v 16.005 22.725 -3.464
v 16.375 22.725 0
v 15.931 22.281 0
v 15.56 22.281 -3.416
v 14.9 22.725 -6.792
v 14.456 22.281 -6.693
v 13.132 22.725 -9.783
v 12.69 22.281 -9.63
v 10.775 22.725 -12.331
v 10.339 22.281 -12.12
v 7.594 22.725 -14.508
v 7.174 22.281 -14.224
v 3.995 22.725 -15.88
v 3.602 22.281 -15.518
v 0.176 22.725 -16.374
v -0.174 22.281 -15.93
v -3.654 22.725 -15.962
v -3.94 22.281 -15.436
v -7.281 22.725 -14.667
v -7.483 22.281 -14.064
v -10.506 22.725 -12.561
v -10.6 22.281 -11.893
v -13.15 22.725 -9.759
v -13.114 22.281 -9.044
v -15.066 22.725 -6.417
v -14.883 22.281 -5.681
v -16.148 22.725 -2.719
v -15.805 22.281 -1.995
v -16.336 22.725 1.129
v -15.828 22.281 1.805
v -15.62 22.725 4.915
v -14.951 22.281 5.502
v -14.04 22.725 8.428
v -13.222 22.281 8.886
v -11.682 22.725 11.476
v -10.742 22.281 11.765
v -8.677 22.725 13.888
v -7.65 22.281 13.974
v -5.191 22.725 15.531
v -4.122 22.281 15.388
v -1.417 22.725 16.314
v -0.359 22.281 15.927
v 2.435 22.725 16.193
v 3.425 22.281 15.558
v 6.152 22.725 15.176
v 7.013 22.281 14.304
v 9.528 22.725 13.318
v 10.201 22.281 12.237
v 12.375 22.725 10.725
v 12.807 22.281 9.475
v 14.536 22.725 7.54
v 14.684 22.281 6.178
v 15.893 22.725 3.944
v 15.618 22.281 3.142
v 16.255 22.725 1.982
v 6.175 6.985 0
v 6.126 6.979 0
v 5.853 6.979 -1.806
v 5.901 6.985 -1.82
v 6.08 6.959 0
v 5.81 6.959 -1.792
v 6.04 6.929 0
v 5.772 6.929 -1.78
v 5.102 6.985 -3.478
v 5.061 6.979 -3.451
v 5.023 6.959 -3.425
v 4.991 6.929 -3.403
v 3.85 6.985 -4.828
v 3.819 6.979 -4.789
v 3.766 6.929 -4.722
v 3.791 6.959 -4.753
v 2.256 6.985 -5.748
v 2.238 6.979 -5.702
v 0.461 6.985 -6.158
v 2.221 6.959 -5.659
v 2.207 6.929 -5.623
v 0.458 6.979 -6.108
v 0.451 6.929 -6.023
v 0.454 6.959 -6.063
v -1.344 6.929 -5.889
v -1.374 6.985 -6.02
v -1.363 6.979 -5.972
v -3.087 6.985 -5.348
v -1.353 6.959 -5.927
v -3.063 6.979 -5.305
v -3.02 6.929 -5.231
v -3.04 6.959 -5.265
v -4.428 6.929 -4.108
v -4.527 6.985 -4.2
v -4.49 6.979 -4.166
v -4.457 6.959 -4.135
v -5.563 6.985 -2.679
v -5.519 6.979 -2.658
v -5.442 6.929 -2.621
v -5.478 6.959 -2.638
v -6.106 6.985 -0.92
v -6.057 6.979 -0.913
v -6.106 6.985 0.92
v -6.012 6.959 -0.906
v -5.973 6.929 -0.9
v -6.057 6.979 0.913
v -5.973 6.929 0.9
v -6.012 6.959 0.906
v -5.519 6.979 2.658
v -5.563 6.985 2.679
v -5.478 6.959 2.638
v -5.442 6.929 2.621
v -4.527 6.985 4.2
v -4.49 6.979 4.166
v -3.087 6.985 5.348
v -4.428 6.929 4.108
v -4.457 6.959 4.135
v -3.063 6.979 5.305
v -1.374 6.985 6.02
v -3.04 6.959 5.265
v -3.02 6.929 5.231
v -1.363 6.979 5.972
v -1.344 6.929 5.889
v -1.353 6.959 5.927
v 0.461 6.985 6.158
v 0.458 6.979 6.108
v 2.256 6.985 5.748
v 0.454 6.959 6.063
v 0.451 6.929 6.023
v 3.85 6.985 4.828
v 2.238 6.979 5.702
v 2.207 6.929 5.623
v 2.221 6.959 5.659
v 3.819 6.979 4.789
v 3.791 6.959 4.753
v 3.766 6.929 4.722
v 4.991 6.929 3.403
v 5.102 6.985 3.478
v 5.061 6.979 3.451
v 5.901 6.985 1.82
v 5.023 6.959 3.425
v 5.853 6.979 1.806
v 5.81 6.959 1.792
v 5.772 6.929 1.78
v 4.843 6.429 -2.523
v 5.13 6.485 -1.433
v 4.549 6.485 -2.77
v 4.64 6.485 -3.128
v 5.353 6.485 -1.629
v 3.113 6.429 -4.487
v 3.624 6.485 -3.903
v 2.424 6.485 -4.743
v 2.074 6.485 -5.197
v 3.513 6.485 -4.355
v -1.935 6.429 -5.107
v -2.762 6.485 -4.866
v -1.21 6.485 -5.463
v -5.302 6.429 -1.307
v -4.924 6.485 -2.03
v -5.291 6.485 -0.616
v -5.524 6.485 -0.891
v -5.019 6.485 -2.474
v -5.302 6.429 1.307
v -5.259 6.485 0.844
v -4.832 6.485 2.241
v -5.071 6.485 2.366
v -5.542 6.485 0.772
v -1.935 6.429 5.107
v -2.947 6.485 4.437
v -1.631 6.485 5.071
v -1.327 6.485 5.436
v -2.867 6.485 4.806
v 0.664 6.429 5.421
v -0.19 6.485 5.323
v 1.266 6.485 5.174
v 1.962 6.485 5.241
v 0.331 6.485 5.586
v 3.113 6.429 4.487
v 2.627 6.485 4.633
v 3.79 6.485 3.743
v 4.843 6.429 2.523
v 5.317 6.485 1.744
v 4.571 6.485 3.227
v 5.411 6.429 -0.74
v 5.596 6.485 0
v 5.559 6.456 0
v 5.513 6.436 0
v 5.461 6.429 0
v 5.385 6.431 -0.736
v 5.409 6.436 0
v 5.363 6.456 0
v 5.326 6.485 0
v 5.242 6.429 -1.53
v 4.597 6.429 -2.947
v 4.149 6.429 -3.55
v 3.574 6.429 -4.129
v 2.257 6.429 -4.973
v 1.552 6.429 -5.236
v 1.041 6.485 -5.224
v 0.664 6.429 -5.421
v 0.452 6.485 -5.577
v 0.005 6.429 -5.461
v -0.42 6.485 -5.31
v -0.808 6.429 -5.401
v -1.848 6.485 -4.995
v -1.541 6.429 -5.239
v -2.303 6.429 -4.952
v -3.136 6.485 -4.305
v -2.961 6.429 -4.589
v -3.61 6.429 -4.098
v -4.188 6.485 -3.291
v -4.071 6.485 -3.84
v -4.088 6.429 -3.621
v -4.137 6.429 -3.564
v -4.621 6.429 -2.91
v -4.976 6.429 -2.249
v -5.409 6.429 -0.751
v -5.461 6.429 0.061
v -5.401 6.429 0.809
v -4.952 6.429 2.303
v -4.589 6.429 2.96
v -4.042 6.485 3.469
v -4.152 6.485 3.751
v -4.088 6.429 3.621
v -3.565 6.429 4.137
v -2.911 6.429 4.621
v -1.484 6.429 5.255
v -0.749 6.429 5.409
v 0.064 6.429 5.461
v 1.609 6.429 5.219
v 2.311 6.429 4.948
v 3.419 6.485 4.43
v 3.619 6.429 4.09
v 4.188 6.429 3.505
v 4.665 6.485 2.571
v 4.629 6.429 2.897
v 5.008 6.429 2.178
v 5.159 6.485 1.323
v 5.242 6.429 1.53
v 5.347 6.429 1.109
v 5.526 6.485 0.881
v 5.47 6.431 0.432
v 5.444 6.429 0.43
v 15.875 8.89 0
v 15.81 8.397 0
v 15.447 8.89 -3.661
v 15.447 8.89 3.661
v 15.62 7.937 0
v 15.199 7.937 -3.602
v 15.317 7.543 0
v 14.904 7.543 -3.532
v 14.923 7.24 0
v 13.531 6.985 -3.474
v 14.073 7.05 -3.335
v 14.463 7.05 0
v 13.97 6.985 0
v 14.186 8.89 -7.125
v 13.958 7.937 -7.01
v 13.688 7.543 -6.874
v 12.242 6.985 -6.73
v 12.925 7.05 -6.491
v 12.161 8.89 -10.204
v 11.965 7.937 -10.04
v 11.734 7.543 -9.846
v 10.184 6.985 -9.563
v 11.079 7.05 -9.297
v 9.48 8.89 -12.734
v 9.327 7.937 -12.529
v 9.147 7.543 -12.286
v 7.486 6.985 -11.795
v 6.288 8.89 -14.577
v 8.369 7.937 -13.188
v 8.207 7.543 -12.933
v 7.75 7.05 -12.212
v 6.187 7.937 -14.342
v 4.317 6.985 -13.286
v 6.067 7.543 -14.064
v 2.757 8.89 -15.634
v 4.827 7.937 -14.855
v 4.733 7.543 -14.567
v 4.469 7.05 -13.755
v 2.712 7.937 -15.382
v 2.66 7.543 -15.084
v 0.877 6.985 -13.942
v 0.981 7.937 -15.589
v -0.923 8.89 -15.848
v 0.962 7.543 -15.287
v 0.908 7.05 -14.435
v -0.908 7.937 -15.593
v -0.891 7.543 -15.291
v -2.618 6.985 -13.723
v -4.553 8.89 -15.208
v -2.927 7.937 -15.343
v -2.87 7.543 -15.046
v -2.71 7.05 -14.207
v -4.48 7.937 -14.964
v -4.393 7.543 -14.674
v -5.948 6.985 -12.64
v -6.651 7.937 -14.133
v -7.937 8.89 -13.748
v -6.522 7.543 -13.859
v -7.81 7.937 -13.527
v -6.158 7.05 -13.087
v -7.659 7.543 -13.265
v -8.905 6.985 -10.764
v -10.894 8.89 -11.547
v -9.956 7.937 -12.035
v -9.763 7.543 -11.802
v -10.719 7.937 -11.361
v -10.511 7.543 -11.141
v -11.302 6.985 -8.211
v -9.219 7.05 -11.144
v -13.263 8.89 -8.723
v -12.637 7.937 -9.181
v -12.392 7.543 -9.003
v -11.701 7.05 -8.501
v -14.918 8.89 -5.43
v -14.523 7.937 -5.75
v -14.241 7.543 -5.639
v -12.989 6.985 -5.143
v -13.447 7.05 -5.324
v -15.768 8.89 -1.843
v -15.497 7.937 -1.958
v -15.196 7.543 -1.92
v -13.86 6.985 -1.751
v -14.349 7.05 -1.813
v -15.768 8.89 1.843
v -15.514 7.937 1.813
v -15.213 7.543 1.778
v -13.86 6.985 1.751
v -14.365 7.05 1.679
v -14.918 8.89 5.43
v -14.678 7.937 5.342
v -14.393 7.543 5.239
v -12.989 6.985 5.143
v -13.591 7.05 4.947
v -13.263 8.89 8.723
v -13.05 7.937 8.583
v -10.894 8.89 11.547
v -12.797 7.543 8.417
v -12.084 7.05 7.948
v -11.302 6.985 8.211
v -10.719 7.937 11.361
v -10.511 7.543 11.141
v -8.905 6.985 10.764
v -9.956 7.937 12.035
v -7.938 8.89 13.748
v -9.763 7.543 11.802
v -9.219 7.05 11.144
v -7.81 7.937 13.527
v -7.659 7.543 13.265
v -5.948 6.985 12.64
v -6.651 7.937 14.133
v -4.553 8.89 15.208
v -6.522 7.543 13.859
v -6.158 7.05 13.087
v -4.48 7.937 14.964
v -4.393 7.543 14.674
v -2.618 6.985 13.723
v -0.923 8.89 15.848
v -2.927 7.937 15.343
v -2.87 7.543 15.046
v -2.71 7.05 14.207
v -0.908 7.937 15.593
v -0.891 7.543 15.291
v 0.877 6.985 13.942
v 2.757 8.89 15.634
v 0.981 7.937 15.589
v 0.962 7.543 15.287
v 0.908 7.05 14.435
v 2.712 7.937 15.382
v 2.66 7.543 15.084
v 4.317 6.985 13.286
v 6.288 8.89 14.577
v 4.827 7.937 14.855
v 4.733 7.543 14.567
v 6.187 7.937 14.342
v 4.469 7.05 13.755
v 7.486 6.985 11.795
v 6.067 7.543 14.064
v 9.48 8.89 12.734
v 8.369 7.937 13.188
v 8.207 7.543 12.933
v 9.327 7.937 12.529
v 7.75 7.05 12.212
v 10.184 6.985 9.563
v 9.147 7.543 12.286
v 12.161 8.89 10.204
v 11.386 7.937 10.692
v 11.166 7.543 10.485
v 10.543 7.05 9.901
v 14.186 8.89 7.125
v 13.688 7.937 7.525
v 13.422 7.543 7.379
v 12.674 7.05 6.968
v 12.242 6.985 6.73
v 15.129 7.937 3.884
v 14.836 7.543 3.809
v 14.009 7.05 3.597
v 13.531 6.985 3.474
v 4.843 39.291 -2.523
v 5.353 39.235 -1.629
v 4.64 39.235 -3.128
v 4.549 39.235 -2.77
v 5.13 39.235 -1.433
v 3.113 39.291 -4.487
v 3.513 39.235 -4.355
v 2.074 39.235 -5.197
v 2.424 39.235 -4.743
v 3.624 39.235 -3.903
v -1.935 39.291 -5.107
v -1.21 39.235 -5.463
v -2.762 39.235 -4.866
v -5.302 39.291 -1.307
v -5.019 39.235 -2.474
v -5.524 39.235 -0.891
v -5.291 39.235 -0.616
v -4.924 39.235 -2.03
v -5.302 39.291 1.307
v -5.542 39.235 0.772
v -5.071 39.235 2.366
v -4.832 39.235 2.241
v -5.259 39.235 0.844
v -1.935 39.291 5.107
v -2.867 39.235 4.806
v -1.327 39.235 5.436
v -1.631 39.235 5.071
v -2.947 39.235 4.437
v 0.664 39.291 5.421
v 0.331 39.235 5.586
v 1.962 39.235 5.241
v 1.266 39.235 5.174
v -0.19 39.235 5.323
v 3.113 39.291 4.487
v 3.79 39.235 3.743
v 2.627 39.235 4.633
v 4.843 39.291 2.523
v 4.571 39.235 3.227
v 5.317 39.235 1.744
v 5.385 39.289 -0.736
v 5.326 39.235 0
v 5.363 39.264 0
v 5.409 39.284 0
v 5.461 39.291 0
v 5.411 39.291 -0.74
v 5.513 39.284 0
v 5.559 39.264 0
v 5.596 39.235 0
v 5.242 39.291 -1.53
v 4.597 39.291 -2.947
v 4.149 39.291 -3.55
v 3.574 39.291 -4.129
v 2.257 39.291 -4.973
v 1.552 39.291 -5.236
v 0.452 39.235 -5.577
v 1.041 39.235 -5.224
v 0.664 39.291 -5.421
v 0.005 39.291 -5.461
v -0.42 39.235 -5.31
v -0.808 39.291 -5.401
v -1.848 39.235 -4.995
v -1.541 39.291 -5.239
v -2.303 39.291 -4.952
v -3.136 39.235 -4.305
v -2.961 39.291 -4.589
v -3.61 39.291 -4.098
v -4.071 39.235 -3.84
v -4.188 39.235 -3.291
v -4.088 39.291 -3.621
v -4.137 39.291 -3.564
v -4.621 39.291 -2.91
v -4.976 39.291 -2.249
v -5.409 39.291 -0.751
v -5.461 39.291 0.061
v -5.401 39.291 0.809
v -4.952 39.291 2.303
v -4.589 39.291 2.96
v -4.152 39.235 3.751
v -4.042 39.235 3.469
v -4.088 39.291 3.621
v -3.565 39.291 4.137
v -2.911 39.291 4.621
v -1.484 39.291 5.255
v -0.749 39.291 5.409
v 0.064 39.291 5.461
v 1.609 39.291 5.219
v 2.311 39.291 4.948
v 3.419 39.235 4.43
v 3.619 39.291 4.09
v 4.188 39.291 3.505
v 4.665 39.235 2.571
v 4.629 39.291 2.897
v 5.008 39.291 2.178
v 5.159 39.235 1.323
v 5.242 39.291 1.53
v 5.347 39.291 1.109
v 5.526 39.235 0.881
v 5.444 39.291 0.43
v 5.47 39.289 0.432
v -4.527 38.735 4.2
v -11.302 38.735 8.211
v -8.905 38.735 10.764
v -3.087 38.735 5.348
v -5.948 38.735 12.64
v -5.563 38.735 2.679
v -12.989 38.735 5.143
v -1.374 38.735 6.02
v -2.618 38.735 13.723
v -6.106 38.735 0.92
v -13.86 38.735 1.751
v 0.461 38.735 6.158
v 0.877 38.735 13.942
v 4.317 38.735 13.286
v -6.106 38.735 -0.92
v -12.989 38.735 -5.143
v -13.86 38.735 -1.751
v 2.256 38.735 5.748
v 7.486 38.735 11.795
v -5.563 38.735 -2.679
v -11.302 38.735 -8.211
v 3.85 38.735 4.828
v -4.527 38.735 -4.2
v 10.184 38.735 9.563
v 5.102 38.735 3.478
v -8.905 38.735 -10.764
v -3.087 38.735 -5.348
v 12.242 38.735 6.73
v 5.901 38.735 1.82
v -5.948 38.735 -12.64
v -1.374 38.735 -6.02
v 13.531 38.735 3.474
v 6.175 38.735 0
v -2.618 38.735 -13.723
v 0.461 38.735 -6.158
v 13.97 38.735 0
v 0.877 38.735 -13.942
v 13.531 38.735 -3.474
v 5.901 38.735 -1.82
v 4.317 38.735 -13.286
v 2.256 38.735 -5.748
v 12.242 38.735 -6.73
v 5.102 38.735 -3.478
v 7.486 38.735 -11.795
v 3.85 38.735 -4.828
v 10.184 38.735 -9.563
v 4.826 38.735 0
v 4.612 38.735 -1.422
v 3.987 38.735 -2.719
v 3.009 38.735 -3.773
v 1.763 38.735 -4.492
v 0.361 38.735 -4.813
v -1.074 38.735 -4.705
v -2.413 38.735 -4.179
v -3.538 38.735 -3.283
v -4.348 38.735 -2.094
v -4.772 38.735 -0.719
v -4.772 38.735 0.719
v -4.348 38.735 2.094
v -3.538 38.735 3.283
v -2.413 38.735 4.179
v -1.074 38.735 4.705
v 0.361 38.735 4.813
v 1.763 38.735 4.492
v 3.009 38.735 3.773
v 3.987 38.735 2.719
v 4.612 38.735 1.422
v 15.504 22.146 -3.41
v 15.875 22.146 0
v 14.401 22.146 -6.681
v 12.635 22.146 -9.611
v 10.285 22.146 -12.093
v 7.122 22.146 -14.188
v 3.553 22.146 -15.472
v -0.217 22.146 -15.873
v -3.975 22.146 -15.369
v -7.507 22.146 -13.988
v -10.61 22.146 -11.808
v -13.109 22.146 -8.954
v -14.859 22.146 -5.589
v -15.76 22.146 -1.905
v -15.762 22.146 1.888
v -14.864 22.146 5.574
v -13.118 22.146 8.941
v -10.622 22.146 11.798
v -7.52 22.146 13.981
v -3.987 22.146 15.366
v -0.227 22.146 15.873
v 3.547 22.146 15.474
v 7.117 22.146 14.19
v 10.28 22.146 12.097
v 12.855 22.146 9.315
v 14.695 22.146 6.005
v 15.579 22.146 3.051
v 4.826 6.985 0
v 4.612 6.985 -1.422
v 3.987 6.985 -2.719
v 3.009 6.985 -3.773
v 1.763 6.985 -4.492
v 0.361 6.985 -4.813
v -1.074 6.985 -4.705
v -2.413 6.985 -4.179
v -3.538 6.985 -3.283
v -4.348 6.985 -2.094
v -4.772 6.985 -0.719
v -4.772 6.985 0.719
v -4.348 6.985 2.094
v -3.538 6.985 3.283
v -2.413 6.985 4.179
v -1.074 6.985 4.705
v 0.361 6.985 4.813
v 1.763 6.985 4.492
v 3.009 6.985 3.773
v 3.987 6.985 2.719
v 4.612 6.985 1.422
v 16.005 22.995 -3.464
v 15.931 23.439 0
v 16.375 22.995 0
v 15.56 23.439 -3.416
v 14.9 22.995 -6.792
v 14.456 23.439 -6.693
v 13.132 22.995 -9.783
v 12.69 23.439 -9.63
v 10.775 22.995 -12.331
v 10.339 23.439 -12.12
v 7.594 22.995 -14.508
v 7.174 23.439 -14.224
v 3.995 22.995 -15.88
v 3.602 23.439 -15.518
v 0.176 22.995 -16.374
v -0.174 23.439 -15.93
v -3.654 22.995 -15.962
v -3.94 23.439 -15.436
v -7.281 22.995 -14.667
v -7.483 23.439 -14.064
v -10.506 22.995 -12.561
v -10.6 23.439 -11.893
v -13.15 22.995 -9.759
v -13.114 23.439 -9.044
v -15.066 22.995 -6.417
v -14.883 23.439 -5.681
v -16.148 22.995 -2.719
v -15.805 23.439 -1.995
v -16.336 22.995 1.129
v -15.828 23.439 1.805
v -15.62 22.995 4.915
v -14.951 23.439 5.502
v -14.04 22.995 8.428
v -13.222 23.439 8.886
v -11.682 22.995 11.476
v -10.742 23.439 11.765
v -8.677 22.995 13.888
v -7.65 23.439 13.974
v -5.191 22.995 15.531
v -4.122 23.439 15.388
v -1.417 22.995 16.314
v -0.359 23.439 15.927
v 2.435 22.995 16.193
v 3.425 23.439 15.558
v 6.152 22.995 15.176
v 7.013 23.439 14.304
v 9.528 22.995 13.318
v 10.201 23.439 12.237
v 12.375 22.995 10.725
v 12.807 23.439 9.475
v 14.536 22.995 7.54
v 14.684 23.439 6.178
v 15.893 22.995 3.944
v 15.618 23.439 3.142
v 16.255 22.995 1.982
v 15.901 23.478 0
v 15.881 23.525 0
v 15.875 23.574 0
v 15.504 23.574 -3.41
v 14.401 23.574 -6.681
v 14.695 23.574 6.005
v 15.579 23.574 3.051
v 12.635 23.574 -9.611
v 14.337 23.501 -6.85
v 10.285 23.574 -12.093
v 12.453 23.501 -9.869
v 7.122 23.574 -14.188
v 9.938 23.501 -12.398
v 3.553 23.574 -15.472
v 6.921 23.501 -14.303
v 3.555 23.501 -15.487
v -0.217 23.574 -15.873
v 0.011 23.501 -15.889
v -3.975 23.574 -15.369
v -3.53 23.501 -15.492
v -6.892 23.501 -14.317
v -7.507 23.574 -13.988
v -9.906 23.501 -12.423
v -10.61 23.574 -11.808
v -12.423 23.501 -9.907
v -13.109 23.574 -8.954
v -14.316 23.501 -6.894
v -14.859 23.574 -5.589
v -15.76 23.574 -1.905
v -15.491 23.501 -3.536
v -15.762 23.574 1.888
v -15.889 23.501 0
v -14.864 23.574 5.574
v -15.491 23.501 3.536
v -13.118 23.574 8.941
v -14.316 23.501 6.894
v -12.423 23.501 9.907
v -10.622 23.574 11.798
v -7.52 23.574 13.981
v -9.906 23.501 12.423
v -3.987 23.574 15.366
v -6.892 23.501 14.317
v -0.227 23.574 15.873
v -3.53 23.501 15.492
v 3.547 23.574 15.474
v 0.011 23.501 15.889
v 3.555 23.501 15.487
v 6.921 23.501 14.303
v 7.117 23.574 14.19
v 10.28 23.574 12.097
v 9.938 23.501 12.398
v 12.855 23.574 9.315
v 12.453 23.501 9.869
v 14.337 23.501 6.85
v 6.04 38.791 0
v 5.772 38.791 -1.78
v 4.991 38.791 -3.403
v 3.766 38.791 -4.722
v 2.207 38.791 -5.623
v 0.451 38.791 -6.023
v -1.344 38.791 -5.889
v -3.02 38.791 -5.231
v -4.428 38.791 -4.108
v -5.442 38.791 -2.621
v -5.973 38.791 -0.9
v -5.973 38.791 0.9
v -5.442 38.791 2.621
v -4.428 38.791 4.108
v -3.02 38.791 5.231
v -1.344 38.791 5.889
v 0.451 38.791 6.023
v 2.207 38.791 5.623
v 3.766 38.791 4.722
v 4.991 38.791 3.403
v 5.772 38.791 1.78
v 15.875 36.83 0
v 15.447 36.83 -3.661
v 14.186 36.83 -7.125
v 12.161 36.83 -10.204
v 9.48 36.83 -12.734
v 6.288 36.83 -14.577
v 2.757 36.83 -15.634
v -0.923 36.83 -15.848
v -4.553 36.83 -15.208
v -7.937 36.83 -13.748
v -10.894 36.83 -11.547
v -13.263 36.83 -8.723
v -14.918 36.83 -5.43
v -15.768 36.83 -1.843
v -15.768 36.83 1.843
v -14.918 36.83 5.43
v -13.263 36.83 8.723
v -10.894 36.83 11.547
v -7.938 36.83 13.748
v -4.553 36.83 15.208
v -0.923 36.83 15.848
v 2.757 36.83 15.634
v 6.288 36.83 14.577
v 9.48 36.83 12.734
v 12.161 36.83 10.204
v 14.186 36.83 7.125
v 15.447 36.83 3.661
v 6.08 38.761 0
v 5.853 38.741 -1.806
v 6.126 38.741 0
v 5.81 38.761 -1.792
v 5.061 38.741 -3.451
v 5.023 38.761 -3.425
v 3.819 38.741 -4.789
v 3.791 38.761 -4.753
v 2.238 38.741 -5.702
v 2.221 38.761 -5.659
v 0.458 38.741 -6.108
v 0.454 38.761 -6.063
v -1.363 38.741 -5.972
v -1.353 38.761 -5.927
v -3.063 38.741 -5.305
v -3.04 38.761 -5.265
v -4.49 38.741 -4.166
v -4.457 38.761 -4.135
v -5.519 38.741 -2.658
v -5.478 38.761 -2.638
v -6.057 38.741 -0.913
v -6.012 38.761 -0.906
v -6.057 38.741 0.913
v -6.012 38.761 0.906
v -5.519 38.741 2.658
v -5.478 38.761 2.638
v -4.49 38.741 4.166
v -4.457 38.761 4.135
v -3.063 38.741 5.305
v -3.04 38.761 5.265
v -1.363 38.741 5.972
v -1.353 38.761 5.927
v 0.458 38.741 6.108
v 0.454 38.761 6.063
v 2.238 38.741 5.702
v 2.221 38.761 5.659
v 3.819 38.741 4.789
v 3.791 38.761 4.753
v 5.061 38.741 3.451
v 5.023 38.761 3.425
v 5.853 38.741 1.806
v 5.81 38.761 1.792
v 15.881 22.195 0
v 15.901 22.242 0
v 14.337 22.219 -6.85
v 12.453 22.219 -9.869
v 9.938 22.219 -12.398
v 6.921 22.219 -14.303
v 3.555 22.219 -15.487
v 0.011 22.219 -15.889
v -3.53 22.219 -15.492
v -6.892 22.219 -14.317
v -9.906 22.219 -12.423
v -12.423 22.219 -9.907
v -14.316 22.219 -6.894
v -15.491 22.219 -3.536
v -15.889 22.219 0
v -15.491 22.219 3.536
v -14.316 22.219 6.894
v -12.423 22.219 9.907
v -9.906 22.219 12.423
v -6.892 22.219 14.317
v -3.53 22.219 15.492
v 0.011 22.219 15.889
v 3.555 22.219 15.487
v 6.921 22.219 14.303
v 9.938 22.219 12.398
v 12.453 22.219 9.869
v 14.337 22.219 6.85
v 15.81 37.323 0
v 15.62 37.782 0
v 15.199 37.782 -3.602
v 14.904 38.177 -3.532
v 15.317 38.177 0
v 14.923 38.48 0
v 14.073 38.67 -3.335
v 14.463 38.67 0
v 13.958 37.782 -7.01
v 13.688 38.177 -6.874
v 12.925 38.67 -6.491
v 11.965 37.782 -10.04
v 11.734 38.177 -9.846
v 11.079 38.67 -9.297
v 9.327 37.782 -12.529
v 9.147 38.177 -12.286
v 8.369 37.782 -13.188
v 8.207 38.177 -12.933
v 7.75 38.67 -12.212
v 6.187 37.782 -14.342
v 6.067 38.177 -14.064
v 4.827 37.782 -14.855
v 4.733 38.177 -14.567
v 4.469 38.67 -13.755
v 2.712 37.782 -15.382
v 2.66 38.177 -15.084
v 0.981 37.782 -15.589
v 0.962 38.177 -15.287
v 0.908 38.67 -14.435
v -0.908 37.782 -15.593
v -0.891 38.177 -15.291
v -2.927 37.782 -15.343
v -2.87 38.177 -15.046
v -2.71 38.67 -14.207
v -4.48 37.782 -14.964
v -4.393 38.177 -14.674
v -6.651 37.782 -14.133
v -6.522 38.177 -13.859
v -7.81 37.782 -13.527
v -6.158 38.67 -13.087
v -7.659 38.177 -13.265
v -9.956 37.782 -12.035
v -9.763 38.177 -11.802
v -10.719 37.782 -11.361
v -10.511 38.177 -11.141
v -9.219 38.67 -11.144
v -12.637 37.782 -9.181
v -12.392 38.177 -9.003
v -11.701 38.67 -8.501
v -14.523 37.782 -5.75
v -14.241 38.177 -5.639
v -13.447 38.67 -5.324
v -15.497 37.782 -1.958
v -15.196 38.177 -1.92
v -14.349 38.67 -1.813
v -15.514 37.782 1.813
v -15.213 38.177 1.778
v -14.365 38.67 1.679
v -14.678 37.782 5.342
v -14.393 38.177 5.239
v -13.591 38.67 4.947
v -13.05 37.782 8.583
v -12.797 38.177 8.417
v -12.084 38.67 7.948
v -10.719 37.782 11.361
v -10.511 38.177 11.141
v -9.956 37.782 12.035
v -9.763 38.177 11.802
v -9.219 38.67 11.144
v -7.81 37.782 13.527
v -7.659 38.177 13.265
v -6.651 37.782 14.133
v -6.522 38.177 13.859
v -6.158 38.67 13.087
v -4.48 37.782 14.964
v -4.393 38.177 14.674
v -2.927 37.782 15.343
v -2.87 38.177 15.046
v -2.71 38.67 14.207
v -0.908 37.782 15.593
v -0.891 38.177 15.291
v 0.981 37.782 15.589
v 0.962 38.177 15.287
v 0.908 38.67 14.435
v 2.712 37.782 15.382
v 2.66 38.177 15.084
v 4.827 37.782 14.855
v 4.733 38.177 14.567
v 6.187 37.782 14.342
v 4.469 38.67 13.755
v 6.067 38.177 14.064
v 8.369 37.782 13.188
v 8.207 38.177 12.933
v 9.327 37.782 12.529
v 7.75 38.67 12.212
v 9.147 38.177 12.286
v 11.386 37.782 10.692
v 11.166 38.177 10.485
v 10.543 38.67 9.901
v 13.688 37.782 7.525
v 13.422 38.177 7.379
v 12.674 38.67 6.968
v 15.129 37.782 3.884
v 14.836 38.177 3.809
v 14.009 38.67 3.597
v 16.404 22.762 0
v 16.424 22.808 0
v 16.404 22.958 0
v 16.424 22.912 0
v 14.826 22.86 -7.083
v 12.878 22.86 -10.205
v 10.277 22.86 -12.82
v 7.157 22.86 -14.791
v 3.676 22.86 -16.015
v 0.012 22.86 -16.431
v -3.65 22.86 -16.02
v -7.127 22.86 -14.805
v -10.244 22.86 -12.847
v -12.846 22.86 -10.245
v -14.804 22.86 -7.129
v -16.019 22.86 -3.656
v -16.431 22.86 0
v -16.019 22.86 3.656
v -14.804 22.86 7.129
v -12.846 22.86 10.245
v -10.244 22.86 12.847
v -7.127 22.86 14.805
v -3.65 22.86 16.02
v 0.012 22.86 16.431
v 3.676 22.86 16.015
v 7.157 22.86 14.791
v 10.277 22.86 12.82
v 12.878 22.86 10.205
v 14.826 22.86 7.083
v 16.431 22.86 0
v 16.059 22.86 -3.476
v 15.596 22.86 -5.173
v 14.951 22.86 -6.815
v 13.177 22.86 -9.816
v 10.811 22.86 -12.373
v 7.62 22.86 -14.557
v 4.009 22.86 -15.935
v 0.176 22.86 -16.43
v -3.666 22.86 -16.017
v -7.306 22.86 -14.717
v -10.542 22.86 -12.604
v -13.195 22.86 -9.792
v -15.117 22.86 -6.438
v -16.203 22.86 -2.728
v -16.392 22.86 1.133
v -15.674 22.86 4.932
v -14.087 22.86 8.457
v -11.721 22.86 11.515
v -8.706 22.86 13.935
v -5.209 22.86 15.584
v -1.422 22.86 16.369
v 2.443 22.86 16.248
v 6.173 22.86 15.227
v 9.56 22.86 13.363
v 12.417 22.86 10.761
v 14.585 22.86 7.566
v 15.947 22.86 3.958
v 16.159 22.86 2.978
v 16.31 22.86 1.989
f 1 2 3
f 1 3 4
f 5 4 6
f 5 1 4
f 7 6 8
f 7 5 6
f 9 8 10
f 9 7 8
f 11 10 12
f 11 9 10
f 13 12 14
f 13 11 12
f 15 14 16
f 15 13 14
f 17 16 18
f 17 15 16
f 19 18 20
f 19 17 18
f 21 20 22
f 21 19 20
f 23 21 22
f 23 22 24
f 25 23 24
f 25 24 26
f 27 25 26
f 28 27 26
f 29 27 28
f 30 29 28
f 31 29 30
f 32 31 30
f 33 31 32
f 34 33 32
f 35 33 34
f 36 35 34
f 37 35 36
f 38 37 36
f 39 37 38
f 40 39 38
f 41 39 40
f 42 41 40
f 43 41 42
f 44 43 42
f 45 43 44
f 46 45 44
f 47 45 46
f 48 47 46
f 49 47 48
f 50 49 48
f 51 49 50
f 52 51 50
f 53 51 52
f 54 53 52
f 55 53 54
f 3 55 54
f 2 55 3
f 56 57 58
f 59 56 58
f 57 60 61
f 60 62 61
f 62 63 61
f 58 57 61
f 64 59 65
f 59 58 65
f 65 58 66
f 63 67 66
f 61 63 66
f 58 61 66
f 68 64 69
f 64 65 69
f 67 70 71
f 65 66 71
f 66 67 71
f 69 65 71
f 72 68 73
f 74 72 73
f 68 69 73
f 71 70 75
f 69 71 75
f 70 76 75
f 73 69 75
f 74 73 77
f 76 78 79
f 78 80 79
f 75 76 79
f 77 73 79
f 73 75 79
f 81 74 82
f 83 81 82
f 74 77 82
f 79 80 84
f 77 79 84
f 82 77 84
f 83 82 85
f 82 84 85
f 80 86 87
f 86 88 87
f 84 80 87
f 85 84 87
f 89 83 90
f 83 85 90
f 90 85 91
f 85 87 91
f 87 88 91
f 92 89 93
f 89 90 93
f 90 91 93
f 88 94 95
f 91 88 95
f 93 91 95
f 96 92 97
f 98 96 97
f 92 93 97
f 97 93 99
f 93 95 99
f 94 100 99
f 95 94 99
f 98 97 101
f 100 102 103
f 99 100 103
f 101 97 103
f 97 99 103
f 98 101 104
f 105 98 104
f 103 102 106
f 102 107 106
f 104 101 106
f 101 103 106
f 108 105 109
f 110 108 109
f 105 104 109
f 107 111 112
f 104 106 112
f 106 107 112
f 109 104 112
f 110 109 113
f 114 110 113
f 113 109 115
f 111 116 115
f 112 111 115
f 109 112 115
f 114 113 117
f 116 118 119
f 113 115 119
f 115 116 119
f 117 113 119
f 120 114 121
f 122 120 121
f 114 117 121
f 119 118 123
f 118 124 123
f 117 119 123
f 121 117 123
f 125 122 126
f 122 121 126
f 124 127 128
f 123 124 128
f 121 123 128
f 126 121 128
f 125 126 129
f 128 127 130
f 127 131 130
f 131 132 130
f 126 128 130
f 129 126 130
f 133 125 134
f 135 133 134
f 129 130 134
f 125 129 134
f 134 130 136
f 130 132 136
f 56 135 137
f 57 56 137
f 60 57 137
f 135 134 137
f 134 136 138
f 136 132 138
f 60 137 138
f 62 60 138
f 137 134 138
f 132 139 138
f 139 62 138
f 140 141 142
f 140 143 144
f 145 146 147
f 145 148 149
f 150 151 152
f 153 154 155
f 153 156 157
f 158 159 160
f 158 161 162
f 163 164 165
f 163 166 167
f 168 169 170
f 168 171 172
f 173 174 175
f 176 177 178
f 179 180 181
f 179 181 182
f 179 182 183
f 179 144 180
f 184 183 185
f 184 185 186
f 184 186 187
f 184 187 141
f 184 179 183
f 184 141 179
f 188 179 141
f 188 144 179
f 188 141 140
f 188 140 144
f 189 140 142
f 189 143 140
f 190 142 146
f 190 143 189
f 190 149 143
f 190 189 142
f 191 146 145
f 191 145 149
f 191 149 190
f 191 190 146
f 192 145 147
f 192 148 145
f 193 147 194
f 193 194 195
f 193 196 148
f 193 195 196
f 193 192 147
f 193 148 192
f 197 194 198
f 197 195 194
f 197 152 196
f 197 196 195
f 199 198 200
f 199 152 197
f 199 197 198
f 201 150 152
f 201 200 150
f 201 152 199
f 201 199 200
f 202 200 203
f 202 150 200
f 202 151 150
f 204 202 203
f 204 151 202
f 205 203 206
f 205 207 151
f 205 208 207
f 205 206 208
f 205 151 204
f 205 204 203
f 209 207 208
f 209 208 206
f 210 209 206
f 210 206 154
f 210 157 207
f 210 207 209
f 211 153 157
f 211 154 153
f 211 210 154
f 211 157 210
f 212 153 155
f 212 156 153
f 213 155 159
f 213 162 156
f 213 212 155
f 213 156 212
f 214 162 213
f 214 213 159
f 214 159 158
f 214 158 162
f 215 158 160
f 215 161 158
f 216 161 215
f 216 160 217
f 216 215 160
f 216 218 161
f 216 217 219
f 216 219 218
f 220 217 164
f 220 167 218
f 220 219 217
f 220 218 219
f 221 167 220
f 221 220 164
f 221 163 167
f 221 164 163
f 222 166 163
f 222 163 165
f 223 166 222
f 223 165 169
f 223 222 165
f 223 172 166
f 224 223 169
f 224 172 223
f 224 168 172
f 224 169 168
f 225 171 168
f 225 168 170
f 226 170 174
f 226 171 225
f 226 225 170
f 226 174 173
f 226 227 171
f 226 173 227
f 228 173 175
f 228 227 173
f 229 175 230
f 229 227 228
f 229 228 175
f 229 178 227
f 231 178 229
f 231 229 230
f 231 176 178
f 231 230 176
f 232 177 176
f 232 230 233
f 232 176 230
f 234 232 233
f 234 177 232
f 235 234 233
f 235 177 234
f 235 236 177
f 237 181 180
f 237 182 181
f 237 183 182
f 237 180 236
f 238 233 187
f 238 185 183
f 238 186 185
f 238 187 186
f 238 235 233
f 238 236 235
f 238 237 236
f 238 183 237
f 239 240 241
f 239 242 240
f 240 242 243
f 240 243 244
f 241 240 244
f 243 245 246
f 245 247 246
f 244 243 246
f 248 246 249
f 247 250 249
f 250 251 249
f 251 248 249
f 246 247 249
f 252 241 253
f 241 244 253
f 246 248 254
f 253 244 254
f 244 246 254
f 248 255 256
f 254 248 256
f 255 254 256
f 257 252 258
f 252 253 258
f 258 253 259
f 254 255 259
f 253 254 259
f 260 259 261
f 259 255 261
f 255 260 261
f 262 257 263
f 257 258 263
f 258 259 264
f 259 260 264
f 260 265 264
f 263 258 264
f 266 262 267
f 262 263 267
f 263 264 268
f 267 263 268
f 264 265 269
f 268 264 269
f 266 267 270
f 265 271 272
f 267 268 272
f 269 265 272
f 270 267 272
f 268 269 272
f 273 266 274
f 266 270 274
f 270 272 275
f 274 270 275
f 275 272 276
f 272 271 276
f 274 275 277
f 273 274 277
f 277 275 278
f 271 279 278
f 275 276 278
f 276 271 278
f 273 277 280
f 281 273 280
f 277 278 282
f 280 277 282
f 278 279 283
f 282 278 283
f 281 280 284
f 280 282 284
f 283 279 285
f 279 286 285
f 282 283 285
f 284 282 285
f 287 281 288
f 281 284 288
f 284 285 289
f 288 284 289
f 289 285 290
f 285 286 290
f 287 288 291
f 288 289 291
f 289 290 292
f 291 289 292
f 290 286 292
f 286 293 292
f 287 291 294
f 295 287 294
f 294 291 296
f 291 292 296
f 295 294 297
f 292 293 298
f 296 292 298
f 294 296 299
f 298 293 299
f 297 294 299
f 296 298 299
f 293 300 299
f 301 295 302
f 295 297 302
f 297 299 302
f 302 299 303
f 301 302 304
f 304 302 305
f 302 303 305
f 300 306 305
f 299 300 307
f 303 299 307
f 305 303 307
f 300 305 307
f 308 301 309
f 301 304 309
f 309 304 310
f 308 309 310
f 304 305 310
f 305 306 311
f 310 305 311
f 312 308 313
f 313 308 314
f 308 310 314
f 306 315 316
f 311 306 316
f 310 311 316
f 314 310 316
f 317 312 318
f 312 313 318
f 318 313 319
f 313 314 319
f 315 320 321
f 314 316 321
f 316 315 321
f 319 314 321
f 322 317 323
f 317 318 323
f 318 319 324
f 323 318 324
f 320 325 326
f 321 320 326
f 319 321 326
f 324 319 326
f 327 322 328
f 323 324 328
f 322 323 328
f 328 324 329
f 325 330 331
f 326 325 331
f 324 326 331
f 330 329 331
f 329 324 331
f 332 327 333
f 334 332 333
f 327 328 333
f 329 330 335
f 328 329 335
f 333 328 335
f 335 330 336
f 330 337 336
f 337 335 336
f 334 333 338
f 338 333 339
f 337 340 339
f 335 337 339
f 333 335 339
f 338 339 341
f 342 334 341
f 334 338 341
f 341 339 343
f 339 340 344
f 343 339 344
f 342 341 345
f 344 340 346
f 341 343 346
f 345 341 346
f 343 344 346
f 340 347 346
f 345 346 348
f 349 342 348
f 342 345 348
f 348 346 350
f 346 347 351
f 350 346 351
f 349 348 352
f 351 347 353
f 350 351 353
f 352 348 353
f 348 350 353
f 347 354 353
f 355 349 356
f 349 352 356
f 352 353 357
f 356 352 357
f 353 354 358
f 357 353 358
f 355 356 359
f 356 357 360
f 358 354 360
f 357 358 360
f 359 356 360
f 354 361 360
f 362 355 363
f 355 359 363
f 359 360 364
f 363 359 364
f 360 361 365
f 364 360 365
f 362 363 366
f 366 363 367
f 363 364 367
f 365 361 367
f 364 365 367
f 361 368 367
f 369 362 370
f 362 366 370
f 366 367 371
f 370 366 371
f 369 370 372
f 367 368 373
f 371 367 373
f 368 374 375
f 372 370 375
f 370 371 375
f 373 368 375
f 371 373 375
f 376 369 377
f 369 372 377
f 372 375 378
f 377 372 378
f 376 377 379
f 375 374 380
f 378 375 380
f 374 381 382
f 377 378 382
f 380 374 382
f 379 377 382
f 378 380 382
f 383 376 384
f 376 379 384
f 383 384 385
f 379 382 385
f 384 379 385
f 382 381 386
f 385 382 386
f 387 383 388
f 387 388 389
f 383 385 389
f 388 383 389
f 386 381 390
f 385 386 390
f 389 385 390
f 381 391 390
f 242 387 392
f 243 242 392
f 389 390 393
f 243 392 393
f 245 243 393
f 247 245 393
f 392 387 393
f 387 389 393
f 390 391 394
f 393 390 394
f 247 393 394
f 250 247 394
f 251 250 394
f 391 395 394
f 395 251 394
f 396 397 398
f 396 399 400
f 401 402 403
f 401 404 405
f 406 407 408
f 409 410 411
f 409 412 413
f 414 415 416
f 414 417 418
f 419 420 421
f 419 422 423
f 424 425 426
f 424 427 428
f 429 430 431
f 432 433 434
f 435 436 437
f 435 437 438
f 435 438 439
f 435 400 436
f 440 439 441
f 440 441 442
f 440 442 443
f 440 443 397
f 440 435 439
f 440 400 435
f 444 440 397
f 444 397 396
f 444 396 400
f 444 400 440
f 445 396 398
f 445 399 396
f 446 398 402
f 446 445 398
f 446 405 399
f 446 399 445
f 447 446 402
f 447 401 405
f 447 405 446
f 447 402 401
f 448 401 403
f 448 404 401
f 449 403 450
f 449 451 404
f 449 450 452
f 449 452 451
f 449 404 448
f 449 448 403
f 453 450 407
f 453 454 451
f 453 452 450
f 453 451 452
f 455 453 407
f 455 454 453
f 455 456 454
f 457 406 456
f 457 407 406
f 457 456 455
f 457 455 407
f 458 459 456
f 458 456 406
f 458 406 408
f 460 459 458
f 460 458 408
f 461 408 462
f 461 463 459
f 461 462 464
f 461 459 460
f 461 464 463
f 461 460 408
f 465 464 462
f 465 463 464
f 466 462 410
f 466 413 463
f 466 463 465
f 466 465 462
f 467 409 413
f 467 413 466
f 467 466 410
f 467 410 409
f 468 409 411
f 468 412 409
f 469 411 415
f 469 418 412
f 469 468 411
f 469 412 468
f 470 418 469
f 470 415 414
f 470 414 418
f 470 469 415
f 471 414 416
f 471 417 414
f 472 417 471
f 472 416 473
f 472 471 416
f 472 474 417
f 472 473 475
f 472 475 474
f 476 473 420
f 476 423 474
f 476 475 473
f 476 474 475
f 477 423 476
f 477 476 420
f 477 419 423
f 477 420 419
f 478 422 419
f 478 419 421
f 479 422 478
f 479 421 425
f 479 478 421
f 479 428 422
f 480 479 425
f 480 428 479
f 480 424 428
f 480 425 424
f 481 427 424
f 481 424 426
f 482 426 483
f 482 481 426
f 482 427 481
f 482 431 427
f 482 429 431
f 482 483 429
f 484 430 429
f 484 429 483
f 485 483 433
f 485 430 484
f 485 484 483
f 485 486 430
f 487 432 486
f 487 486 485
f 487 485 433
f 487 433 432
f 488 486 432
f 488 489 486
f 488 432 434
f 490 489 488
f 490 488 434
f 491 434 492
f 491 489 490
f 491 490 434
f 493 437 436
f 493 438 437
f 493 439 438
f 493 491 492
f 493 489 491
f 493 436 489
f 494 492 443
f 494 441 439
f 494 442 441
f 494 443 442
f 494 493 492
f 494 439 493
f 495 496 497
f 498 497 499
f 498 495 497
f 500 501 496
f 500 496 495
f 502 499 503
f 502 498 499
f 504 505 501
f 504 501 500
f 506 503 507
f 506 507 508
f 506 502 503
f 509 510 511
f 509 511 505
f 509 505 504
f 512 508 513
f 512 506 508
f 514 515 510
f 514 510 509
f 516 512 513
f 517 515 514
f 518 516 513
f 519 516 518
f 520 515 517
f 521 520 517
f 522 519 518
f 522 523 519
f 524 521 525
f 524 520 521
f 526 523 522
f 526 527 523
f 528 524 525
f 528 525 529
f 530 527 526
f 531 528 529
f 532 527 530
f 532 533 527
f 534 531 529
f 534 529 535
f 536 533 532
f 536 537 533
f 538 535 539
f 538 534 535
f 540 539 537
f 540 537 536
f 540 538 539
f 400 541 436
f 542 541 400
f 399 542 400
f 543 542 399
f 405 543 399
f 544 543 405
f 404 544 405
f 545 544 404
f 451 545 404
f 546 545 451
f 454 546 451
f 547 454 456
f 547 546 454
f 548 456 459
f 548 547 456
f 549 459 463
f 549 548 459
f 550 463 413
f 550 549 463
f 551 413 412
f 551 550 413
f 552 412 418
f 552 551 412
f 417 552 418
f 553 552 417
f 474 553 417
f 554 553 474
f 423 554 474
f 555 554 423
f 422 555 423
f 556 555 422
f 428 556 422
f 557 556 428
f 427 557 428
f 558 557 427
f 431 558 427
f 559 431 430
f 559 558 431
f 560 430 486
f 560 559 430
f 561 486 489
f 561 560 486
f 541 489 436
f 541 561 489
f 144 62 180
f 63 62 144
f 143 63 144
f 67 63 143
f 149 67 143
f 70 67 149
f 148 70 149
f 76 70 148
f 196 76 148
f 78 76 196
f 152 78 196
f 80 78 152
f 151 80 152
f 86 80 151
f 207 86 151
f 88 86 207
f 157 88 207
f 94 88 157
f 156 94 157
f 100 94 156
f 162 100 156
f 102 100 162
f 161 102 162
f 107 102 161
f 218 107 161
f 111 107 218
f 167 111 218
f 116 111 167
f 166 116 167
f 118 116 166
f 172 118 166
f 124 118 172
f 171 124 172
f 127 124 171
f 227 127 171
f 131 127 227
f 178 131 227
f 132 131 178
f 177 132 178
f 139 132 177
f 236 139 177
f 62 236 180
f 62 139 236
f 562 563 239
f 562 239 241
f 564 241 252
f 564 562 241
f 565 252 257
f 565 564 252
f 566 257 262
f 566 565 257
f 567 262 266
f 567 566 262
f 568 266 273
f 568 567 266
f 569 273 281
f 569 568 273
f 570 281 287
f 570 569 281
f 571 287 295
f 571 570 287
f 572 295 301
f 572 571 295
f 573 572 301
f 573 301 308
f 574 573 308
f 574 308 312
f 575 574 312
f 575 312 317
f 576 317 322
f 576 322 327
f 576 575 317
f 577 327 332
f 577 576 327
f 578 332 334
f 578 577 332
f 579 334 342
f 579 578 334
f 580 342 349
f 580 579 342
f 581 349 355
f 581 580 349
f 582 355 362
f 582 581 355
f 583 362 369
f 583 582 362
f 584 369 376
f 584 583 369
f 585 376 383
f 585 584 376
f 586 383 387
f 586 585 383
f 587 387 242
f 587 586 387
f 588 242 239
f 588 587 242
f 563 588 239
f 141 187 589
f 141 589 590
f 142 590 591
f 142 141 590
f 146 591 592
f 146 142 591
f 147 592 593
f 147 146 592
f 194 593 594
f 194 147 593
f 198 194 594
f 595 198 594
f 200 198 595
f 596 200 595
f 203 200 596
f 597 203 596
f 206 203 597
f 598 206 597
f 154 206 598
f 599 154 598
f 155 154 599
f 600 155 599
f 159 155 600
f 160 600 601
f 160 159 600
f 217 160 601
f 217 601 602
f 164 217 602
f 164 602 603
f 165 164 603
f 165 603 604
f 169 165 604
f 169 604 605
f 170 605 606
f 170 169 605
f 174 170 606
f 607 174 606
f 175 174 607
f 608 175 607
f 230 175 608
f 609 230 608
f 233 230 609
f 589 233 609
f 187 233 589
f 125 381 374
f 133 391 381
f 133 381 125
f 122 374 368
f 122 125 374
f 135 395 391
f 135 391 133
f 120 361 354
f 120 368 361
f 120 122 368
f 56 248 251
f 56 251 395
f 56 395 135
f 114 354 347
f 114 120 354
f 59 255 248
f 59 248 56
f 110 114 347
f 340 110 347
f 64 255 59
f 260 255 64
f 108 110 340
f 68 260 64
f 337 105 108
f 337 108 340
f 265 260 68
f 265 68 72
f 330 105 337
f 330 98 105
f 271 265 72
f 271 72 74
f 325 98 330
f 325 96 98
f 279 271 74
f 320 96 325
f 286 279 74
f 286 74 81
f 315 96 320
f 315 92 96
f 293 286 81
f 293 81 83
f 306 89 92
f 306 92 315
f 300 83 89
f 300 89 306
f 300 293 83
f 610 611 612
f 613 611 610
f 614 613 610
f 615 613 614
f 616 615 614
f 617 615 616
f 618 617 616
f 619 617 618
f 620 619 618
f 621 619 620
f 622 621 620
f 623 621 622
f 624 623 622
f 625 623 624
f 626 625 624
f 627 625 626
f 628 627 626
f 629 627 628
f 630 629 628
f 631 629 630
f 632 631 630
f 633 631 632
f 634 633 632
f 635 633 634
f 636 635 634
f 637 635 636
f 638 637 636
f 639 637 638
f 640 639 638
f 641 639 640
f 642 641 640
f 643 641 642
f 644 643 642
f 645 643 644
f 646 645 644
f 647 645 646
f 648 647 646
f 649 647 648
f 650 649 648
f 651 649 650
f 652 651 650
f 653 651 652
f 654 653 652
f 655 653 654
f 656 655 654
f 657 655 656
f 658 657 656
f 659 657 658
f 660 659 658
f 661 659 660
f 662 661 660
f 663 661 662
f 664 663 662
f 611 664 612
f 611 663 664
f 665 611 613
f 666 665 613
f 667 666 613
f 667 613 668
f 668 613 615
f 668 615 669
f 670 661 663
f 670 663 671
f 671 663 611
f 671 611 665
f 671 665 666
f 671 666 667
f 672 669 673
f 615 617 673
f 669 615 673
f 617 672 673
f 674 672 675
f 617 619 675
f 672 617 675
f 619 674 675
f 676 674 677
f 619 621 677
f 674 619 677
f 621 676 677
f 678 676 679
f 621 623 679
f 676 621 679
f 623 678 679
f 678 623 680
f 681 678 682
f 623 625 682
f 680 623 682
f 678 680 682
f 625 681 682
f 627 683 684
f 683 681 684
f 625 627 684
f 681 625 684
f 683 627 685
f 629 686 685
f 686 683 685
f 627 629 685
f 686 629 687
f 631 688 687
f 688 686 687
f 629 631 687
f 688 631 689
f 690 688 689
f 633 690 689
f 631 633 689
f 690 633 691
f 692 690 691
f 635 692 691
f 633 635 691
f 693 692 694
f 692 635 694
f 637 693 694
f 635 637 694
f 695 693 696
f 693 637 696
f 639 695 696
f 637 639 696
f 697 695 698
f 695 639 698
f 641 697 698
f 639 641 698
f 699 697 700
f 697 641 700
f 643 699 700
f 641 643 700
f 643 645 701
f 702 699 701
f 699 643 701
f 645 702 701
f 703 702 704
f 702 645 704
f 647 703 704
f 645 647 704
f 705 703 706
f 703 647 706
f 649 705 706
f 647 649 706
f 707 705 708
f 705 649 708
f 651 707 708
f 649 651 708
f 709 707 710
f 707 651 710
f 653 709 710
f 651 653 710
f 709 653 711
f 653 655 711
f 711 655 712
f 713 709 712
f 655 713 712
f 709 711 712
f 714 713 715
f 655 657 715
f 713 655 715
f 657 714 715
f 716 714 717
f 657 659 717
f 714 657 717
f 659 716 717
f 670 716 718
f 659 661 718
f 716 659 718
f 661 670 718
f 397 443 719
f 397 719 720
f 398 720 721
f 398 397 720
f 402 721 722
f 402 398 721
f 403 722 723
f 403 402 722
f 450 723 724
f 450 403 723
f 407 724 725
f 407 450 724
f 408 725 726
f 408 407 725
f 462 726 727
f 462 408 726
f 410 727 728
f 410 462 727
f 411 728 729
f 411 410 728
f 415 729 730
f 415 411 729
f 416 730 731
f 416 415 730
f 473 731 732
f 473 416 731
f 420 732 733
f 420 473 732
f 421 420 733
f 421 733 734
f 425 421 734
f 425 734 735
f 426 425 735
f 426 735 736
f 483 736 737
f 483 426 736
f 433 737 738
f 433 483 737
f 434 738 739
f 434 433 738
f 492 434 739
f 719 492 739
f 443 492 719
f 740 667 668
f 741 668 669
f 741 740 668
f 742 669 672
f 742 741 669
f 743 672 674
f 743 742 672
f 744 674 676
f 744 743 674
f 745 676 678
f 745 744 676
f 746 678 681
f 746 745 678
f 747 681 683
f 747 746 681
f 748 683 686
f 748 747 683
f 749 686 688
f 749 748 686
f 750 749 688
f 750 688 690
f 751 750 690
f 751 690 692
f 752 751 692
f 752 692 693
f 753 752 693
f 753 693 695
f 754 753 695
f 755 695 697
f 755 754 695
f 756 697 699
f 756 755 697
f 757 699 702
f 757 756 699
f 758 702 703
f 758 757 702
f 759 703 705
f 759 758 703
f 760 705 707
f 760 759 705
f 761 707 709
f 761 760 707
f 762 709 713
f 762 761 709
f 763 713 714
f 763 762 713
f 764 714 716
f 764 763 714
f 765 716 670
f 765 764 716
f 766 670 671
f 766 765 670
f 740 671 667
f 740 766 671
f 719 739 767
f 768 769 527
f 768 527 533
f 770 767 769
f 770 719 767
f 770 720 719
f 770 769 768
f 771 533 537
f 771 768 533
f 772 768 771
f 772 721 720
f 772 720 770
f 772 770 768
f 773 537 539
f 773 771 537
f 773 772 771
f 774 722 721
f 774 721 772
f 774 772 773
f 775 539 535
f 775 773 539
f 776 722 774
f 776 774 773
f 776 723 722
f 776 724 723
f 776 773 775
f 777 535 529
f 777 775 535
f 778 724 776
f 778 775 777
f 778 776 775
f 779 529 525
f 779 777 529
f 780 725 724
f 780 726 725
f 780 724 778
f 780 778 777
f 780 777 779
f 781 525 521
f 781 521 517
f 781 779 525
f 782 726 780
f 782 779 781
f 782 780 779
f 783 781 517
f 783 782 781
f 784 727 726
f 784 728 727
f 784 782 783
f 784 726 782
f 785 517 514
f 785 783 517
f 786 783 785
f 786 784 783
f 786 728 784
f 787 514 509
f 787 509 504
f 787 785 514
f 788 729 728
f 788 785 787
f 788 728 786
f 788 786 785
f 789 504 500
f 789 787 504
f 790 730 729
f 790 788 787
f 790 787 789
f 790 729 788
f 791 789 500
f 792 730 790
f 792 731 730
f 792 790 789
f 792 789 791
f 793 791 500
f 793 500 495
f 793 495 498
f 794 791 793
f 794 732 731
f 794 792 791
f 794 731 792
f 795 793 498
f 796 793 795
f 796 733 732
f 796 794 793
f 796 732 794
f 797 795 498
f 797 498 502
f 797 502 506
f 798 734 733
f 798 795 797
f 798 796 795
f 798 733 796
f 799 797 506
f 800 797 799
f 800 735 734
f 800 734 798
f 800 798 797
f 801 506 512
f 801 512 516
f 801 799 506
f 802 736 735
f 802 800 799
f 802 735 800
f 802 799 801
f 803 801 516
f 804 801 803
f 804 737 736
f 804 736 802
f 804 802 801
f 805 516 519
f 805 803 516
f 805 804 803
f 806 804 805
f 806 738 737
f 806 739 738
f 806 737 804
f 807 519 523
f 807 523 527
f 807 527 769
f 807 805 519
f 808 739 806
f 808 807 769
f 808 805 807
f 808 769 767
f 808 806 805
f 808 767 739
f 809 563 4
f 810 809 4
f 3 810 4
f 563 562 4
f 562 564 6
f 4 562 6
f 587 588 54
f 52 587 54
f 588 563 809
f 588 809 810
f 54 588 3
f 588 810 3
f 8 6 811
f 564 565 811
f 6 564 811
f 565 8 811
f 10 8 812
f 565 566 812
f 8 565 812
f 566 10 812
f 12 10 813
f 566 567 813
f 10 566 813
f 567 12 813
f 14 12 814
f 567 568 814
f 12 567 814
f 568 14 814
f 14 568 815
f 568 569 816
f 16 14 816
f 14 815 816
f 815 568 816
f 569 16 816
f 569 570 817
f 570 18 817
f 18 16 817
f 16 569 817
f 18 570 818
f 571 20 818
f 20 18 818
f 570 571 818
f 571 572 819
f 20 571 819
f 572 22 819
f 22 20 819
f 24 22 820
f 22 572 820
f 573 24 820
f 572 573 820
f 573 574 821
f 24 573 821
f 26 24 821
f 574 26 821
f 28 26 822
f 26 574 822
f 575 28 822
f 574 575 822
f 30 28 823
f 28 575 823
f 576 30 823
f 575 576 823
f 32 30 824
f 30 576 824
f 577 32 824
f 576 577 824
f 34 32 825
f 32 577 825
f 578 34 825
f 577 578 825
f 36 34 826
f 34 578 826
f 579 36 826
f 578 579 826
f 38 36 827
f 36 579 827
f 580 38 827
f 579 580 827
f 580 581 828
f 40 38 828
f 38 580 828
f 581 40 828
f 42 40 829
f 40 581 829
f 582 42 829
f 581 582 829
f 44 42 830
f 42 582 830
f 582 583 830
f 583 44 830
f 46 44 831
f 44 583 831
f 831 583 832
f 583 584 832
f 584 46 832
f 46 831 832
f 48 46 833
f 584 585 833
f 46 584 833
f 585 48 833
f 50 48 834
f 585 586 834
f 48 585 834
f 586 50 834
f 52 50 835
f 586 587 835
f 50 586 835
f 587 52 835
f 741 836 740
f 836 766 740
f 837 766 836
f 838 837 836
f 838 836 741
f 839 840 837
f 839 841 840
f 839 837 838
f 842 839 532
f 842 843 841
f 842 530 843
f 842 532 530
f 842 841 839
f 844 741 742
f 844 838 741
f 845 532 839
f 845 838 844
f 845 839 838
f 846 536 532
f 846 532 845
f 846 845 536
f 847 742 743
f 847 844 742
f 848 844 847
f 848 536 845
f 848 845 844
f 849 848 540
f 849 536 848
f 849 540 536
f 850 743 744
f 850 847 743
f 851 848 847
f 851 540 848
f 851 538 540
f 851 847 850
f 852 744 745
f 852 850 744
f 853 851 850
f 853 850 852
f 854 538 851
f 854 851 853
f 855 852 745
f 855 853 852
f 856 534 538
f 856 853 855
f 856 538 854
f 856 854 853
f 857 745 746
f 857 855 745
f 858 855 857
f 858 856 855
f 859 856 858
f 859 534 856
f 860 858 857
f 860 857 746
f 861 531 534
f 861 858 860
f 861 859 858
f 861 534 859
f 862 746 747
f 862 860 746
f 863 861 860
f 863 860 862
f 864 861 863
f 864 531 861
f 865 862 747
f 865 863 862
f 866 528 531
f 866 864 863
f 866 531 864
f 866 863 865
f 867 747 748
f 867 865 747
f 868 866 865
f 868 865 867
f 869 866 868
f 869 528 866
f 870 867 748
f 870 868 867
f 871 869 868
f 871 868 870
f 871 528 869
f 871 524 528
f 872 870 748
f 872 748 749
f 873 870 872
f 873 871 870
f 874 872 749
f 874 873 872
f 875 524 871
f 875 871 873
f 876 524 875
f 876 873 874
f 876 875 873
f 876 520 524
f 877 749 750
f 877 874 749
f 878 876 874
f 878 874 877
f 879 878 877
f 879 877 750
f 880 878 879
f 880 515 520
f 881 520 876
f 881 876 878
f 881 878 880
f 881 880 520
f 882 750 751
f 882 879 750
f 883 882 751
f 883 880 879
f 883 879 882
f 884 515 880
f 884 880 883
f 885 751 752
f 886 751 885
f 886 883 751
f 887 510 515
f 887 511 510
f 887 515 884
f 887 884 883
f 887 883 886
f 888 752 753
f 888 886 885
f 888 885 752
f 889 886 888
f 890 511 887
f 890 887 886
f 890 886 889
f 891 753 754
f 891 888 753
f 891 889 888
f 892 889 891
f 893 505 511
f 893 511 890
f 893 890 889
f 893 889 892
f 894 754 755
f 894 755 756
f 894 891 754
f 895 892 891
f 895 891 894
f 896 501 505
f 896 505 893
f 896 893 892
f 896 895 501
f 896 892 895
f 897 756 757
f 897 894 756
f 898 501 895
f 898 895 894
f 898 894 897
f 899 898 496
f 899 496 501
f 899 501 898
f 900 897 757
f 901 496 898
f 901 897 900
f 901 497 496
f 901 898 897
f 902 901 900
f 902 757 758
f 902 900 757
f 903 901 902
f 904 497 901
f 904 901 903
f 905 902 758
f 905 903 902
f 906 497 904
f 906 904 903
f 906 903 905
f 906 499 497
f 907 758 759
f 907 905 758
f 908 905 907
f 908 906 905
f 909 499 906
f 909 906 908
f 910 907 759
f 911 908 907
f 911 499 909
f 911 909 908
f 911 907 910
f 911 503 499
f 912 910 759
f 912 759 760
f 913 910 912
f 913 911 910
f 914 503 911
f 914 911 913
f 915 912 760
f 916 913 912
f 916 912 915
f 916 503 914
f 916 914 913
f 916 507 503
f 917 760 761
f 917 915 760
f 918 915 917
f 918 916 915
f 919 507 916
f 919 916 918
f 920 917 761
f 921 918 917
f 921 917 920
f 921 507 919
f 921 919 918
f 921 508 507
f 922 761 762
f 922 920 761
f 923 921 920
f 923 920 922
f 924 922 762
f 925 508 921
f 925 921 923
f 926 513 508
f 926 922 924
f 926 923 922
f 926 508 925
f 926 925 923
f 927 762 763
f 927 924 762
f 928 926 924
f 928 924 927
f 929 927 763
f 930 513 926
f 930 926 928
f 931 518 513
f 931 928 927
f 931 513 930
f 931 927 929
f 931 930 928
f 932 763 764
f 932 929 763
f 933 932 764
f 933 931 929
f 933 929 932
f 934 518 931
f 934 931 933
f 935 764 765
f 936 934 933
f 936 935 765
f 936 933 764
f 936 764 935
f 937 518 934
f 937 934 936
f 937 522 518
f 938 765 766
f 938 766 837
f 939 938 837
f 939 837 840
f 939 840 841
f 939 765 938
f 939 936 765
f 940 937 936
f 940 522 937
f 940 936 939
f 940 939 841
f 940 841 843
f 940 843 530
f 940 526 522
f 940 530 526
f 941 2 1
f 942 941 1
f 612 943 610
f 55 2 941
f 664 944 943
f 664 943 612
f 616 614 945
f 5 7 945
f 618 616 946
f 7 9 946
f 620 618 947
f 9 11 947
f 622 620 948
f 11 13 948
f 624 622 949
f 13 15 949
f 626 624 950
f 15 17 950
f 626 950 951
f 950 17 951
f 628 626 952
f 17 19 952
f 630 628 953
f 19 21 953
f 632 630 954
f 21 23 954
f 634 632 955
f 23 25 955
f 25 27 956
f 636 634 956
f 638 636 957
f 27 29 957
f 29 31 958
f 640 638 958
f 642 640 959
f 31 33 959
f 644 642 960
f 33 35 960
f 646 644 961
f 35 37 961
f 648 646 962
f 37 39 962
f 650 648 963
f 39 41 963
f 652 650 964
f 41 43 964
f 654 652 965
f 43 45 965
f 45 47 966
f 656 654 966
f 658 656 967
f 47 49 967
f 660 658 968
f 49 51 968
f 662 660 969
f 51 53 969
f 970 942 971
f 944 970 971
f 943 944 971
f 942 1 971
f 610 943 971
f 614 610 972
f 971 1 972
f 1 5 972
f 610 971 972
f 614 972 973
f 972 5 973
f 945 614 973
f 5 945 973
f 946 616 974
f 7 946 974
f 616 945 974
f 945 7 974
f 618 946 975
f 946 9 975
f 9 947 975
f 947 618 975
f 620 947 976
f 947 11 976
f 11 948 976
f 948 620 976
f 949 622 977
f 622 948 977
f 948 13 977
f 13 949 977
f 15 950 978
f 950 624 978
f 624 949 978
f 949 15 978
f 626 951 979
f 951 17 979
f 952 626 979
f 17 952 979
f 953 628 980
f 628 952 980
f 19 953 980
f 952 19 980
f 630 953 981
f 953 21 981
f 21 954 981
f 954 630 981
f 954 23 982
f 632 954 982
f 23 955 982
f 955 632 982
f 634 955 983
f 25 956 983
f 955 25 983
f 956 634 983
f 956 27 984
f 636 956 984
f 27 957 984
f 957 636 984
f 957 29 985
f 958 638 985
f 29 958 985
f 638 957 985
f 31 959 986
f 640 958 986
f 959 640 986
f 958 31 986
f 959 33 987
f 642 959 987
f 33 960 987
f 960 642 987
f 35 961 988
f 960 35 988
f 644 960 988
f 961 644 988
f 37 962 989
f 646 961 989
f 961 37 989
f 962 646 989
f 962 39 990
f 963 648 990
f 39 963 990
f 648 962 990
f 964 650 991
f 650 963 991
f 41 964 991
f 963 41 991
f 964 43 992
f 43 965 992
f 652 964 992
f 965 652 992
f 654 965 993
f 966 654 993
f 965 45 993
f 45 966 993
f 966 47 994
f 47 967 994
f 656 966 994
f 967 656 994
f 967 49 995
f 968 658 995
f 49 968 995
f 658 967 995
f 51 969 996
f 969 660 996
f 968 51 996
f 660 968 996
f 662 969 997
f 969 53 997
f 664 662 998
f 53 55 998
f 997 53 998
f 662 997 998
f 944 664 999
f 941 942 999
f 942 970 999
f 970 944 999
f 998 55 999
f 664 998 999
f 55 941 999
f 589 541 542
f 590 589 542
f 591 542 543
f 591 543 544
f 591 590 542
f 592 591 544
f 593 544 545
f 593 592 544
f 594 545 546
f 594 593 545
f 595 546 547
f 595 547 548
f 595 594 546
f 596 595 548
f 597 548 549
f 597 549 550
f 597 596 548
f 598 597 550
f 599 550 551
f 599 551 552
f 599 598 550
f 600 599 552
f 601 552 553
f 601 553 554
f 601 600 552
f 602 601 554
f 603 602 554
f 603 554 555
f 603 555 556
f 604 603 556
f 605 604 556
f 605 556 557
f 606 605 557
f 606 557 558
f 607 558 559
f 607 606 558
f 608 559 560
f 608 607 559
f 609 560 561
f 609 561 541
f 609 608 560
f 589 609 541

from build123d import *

# Parameters (mm, degrees)
FILLET_R    = 1.905
FILLET001_R = 0.1905


with BuildPart() as part:
    # Sketch043 → Revolution002 (revolve)
    with BuildSketch(Plane.XY):
        Polygon((15.875, -15.875), (15.875, -0.635), (16.51, 0), (15.875, 0.635), (15.875, 15.875), (6.096, 15.875), (5.461, 16.51), (4.826, 15.875), (4.826, -15.875), (5.461, -16.51), (6.096, -15.875), align=None)
    revolve(axis=Axis((0, 0, 0), (0, 1, 0)))

    # Fillet
    fillet_edges = [part.edges().sort_by_distance(p)[0] for p in [
        (-15.875, -15.875, 0),
        (-15.875, 15.875, 0),
    ]]
    fillet(fillet_edges, radius=FILLET_R)

    # Fillet001
    fillet001_edges = [part.edges().sort_by_distance(p)[0] for p in [
        (-5.461, 16.51, 0),
        (-16.51, 0, 0),
        (-6.096, 15.875, 0),
        (-15.875, 0.635, 0),
        (-15.875, -0.635, 0),
        (-6.096, -15.875, 0),
        (-5.461, -16.51, 0),
    ]]
    fillet(fillet001_edges, radius=FILLET001_R)


with BuildPart() as part_1:
    # Body003 placement: moved
    add(part.part.moved(Location((0, 22.86, 0))))


solid = part_1.part
